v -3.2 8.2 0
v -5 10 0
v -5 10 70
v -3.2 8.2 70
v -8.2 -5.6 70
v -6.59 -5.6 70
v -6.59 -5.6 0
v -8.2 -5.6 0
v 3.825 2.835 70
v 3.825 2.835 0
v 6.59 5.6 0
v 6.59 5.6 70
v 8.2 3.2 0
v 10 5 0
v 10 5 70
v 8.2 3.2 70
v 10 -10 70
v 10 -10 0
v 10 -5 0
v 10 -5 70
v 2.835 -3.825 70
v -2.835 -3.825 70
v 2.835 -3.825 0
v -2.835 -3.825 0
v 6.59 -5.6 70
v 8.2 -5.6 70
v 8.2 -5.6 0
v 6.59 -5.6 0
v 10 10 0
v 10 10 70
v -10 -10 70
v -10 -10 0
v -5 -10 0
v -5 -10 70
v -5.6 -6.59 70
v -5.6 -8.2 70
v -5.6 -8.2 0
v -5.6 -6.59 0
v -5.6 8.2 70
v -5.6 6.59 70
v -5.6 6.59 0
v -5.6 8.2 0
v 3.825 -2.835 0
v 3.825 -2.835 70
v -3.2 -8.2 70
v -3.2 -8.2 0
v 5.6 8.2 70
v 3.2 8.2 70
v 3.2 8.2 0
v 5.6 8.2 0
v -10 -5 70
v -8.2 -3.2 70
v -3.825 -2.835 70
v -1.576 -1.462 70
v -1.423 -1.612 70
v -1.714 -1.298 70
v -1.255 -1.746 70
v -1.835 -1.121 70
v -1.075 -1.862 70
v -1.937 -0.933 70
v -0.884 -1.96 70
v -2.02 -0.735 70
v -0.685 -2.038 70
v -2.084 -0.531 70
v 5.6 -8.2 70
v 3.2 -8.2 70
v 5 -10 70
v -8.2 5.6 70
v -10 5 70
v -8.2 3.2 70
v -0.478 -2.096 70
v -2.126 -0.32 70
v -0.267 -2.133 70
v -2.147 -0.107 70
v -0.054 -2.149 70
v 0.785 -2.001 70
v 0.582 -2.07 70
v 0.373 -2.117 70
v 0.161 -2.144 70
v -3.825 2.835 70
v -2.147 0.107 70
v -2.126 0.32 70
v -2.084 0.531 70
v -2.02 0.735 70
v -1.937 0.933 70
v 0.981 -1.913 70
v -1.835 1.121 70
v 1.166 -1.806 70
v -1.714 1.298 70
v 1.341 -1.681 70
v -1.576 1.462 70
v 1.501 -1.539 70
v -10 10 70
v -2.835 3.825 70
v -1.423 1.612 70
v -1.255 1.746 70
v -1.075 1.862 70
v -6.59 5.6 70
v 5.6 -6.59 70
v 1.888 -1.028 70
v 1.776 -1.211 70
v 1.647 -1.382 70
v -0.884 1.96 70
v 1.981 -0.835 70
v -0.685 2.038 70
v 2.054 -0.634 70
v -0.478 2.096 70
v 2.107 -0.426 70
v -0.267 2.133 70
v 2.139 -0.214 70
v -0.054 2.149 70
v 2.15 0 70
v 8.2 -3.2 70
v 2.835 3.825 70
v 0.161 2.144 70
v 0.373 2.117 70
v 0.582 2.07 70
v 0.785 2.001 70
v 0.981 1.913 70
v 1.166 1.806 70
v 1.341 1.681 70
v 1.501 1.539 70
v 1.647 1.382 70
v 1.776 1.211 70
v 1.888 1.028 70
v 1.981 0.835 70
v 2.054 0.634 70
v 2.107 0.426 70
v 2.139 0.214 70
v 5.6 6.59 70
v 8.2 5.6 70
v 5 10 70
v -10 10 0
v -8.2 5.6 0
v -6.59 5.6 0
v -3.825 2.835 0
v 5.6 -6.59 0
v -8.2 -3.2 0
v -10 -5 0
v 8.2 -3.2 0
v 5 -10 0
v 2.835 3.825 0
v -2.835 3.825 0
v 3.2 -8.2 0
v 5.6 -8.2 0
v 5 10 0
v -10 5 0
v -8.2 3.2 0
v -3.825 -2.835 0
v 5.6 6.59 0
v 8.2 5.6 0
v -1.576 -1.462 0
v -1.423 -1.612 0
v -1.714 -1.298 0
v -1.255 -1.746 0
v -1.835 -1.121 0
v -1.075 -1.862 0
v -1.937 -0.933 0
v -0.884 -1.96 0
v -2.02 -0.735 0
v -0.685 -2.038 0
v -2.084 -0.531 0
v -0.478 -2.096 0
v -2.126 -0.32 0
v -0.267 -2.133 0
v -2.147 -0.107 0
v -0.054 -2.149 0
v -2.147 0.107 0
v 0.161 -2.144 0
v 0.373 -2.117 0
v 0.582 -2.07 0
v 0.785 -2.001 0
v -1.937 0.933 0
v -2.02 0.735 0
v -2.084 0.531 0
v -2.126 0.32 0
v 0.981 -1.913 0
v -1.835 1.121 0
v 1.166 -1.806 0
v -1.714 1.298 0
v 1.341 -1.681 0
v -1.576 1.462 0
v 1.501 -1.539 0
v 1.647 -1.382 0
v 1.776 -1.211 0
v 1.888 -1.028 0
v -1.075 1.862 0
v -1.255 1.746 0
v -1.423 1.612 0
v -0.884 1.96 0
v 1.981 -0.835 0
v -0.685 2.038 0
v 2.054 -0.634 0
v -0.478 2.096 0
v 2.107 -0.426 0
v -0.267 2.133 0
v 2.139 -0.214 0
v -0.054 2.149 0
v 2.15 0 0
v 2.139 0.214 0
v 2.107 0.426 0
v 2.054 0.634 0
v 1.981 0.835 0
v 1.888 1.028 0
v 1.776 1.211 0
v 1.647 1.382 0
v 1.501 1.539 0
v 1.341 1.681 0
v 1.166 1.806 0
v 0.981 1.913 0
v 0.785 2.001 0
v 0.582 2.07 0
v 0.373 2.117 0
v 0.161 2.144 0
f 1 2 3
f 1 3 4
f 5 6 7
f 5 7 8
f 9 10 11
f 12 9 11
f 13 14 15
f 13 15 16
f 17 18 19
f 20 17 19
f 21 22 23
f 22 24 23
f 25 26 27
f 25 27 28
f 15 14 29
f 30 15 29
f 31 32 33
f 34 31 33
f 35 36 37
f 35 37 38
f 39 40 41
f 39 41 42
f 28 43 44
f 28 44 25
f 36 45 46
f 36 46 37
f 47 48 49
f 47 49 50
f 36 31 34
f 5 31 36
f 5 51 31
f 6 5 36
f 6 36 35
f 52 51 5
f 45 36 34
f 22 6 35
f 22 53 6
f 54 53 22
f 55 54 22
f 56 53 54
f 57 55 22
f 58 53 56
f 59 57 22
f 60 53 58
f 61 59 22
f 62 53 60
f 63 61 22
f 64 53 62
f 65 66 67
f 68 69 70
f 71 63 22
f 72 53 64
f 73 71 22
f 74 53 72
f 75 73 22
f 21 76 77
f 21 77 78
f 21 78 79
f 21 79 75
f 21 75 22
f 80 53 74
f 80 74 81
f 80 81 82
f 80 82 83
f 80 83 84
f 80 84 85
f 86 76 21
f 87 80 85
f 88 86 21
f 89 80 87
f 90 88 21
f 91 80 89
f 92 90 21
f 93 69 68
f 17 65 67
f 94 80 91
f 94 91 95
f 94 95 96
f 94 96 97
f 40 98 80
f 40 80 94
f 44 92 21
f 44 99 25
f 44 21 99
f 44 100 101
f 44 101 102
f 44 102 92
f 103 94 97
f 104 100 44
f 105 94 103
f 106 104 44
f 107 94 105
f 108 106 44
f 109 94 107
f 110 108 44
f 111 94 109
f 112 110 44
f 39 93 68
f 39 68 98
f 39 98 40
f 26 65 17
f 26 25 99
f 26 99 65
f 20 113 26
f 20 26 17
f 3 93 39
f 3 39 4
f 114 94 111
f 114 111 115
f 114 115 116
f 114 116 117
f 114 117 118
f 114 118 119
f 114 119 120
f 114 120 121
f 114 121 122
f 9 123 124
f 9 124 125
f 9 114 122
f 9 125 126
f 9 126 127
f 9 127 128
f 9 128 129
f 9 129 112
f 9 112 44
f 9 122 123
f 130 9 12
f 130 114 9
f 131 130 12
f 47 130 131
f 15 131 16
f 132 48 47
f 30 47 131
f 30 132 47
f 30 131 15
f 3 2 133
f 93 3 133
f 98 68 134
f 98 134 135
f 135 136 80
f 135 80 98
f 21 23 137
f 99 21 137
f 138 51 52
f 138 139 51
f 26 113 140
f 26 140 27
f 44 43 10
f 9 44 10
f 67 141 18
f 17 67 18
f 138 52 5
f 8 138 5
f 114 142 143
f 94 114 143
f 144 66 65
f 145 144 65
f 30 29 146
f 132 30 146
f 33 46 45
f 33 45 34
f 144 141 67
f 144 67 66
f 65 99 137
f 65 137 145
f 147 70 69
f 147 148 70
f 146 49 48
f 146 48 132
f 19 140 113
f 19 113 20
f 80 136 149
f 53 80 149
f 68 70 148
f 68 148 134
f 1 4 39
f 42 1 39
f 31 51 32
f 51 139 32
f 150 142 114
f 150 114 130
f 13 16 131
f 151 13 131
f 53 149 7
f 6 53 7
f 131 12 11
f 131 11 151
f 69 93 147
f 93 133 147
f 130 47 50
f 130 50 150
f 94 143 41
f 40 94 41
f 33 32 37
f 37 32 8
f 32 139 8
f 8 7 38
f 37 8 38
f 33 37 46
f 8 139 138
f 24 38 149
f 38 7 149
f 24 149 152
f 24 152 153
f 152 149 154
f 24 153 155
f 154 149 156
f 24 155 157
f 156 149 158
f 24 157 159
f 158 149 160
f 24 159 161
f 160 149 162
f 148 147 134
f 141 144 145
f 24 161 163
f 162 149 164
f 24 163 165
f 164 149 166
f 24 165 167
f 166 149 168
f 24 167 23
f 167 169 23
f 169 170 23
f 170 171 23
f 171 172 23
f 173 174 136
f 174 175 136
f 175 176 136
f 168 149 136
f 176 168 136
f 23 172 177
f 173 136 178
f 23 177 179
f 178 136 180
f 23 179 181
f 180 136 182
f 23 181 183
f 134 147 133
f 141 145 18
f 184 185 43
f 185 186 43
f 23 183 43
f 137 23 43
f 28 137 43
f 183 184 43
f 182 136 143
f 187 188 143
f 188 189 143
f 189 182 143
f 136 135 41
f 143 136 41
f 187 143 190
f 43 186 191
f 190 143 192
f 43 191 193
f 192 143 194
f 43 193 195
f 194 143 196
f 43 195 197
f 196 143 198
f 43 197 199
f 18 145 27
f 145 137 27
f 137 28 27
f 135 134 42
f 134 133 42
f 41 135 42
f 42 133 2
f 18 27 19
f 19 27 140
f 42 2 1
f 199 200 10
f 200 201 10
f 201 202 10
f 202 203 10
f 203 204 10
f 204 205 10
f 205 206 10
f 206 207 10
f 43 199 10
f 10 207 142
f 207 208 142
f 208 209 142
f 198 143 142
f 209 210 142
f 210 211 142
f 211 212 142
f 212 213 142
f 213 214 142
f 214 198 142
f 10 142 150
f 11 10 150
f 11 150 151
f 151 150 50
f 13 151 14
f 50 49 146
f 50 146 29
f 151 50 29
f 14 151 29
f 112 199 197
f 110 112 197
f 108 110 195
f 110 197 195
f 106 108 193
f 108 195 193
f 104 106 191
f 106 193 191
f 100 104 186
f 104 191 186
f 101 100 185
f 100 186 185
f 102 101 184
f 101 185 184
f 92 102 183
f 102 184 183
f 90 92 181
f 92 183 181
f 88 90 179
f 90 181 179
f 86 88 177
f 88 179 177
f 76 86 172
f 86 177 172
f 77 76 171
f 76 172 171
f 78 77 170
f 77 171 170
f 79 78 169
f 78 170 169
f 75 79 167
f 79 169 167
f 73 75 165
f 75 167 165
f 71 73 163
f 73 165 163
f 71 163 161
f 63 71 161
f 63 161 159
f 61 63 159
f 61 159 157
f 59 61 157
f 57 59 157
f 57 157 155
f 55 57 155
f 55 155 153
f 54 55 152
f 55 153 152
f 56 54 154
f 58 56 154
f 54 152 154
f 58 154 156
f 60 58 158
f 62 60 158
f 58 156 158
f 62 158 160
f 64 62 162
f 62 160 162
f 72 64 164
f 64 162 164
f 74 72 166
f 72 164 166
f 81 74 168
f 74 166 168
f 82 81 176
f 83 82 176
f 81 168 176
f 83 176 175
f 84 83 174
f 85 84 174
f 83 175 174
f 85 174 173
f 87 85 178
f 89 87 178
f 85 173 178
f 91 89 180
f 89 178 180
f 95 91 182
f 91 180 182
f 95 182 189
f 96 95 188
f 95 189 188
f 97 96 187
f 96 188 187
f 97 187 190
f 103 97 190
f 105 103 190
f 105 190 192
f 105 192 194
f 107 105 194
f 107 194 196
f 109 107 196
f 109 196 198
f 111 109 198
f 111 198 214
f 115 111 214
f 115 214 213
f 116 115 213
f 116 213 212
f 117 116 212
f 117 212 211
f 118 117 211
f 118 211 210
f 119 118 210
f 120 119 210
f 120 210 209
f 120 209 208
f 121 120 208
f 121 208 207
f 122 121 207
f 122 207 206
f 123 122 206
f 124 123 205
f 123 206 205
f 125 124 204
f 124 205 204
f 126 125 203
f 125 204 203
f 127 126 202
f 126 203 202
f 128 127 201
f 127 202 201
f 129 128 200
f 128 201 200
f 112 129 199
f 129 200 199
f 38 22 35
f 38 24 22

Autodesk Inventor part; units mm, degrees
ref_plane "YZ Plane" through (0, 0, 0) normal (1, 0, 0) x (0, 1, 0)
ref_plane "XZ Plane" through (0, 0, 0) normal (0, 1, 0) x (-1, 0, 0)
ref_plane "XY Plane" through (0, 0, 0) normal (0, 0, 1) x (1, 0, 0)
sketch "Sketch1" plane through (0, 0, 0) normal (0, 0, 1) x (1, 0, 0)
  line L0 (-10, -10) -> (-5.6, -10)
  line L1 (-10, -5.6) -> (-10, -10)
  line L2 (-5.6, -10) -> (-5, -10)
  line L3 (-3.2, -8.2) -> (-5.6, -8.2)
  line L4 (-2.8351, -3.825) -> (-5.6, -6.5899)
  line L5 (-3.825, -2.8351) -> (-6.5899, -5.6)
  line L6 (0, 0) -> (0, -11) construction
  line L7 (0, 0) -> (-12, 0) construction
  line L8 (-3.2, -8.2) -> (-5, -10)
  line L9 (-6.5899, -5.6) -> (-8.2, -5.6)
  line L10 (-10, -5.6) -> (-10, -5)
  line L11 (-10, -5) -> (-8.2, -3.2)
  line L12 (-8.2, -3.2) -> (-8.2, -5.6)
  line L13 (-5.6, -8.2) -> (-5.6, -6.5899)
  arc A0 (-2.15, 0) -> (0, -2.15) centre (0, 0) ccw
  line L14 (0, 0) -> (-3.825, 0)
  line L15 (-3.825, 0) -> (-3.825, -2.8351)
  line L16 (-2.8351, -3.825) -> (0, -3.825)
  line L17 (0, -3.825) -> (0, 0)
  line L18 (-2.8351, -3.825) -> (-3.825, -3.825) construction
  line L19 (-3.825, -3.825) -> (-3.825, -2.8351) construction
  line L20 (3.825, -2.8351) -> (3.825, -3.825) construction
  line L21 (3.825, -2.8351) -> (3.825, 0)
  line L22 (3.825, -3.825) -> (2.8351, -3.825) construction
  line L23 (3.825, 0) -> (0, 0)
  line L24 (0, -3.825) -> (2.8351, -3.825)
  arc A1 (0, -2.15) -> (2.15, 0) centre (0, 0) ccw
  line L25 (0, 0) -> (0, -3.825)
  line L26 (2.8351, -3.825) -> (5.6, -6.5899)
  line L27 (0, 0) -> (0, -12) construction
  line L28 (0, 0) -> (11, 0) construction
  line L29 (3.825, -2.8351) -> (6.5899, -5.6)
  line L30 (8.2, -3.2) -> (8.2, -5.6)
  line L31 (10, -5.6) -> (10, -5)
  line L32 (8.2, -3.2) -> (10, -5)
  line L33 (8.2, -5.6) -> (6.5899, -5.6)
  line L34 (5.6, -6.5899) -> (5.6, -8.2)
  line L35 (10, -10) -> (10, -5.6)
  line L36 (5.6, -10) -> (10, -10)
  line L37 (3.2, -8.2) -> (5.6, -8.2)
  line L38 (5, -10) -> (3.2, -8.2)
  line L39 (5.6, -10) -> (5, -10)
  line L40 (2.8351, 3.825) -> (3.825, 3.825) construction
  line L41 (2.8351, 3.825) -> (0, 3.825)
  line L42 (3.825, 3.825) -> (3.825, 2.8351) construction
  line L43 (0, 3.825) -> (0, 0)
  line L44 (3.825, 0) -> (3.825, 2.8351)
  arc A2 (2.15, 0) -> (0, 2.15) centre (0, 0) ccw
  line L45 (0, 0) -> (3.825, 0)
  line L46 (3.825, 2.8351) -> (6.5899, 5.6)
  line L47 (0, 0) -> (12, 0) construction
  line L48 (0, 0) -> (0, 11) construction
  line L49 (2.8351, 3.825) -> (5.6, 6.5899)
  line L50 (3.2, 8.2) -> (5.6, 8.2)
  line L51 (5.6, 10) -> (5, 10)
  line L52 (3.2, 8.2) -> (5, 10)
  line L53 (5.6, 8.2) -> (5.6, 6.5899)
  line L54 (6.5899, 5.6) -> (8.2, 5.6)
  line L55 (10, 10) -> (5.6, 10)
  line L56 (10, 5.6) -> (10, 10)
  line L57 (8.2, 3.2) -> (8.2, 5.6)
  line L58 (10, 5) -> (8.2, 3.2)
  line L59 (10, 5.6) -> (10, 5)
  line L60 (-3.825, 2.8351) -> (-3.825, 3.825) construction
  line L61 (-3.825, 2.8351) -> (-3.825, 0)
  line L62 (-3.825, 3.825) -> (-2.8351, 3.825) construction
  line L63 (-3.825, 0) -> (0, 0)
  line L64 (0, 3.825) -> (-2.8351, 3.825)
  arc A3 (0, 2.15) -> (-2.15, 0) centre (0, 0) ccw
  line L65 (0, 0) -> (0, 3.825)
  line L66 (-2.8351, 3.825) -> (-5.6, 6.5899)
  line L67 (0, 0) -> (0, 12) construction
  line L68 (0, 0) -> (-11, 0) construction
  line L69 (-3.825, 2.8351) -> (-6.5899, 5.6)
  line L70 (-8.2, 3.2) -> (-8.2, 5.6)
  line L71 (-10, 5.6) -> (-10, 5)
  line L72 (-8.2, 3.2) -> (-10, 5)
  line L73 (-8.2, 5.6) -> (-6.5899, 5.6)
  line L74 (-5.6, 6.5899) -> (-5.6, 8.2)
  line L75 (-10, 10) -> (-10, 5.6)
  line L76 (-5.6, 10) -> (-10, 10)
  line L77 (-3.2, 8.2) -> (-5.6, 8.2)
  line L78 (-5, 10) -> (-3.2, 8.2)
  line L79 (-5.6, 10) -> (-5, 10)
  point P0 (0, 2.15)
  point P1 (2.15, 0)
  point P2 (0, -2.15)
  dimension "d16" = 10
  dimension "d19" = 3.2
  dimension "d21" = 4.4
  dimension "d22" = 4.4
  dimension "d24" = 45
  dimension "d25" = 1.8
  dimension "d27" = 1.8
  dimension "d28" = 45
  dimension "d29" = 3.2
  dimension "d31" = 1.4
  dimension "d33" = 2.15
  dimension "d34" = 3.825
  dimension "d35" = 3.825
  dimension "d36" = 135
  dimension "d39" = 360
extrude "Extrusion1" add sketch "Sketch1" along normal blind 70 contours L1 L10 L11 L12 L9 L5 L15 L14 A0 L17 L16 L4 L13 L3 L8 L2 L0 | L17 A1 L23 L21 L29 L33 L30 L32 L31 L35 L36 L39 L38 L37 L34 L26 L24 | L61 L69 L73 L70 L72 L71 L75 L76 L79 L78 L77 L74 L66 L64 L43 A3 L14 | A2 L43 L41 L49 L53 L50 L52 L51 L55 L56 L59 L58 L57 L54 L46 L44 L23
properties part number "AP20x20"
